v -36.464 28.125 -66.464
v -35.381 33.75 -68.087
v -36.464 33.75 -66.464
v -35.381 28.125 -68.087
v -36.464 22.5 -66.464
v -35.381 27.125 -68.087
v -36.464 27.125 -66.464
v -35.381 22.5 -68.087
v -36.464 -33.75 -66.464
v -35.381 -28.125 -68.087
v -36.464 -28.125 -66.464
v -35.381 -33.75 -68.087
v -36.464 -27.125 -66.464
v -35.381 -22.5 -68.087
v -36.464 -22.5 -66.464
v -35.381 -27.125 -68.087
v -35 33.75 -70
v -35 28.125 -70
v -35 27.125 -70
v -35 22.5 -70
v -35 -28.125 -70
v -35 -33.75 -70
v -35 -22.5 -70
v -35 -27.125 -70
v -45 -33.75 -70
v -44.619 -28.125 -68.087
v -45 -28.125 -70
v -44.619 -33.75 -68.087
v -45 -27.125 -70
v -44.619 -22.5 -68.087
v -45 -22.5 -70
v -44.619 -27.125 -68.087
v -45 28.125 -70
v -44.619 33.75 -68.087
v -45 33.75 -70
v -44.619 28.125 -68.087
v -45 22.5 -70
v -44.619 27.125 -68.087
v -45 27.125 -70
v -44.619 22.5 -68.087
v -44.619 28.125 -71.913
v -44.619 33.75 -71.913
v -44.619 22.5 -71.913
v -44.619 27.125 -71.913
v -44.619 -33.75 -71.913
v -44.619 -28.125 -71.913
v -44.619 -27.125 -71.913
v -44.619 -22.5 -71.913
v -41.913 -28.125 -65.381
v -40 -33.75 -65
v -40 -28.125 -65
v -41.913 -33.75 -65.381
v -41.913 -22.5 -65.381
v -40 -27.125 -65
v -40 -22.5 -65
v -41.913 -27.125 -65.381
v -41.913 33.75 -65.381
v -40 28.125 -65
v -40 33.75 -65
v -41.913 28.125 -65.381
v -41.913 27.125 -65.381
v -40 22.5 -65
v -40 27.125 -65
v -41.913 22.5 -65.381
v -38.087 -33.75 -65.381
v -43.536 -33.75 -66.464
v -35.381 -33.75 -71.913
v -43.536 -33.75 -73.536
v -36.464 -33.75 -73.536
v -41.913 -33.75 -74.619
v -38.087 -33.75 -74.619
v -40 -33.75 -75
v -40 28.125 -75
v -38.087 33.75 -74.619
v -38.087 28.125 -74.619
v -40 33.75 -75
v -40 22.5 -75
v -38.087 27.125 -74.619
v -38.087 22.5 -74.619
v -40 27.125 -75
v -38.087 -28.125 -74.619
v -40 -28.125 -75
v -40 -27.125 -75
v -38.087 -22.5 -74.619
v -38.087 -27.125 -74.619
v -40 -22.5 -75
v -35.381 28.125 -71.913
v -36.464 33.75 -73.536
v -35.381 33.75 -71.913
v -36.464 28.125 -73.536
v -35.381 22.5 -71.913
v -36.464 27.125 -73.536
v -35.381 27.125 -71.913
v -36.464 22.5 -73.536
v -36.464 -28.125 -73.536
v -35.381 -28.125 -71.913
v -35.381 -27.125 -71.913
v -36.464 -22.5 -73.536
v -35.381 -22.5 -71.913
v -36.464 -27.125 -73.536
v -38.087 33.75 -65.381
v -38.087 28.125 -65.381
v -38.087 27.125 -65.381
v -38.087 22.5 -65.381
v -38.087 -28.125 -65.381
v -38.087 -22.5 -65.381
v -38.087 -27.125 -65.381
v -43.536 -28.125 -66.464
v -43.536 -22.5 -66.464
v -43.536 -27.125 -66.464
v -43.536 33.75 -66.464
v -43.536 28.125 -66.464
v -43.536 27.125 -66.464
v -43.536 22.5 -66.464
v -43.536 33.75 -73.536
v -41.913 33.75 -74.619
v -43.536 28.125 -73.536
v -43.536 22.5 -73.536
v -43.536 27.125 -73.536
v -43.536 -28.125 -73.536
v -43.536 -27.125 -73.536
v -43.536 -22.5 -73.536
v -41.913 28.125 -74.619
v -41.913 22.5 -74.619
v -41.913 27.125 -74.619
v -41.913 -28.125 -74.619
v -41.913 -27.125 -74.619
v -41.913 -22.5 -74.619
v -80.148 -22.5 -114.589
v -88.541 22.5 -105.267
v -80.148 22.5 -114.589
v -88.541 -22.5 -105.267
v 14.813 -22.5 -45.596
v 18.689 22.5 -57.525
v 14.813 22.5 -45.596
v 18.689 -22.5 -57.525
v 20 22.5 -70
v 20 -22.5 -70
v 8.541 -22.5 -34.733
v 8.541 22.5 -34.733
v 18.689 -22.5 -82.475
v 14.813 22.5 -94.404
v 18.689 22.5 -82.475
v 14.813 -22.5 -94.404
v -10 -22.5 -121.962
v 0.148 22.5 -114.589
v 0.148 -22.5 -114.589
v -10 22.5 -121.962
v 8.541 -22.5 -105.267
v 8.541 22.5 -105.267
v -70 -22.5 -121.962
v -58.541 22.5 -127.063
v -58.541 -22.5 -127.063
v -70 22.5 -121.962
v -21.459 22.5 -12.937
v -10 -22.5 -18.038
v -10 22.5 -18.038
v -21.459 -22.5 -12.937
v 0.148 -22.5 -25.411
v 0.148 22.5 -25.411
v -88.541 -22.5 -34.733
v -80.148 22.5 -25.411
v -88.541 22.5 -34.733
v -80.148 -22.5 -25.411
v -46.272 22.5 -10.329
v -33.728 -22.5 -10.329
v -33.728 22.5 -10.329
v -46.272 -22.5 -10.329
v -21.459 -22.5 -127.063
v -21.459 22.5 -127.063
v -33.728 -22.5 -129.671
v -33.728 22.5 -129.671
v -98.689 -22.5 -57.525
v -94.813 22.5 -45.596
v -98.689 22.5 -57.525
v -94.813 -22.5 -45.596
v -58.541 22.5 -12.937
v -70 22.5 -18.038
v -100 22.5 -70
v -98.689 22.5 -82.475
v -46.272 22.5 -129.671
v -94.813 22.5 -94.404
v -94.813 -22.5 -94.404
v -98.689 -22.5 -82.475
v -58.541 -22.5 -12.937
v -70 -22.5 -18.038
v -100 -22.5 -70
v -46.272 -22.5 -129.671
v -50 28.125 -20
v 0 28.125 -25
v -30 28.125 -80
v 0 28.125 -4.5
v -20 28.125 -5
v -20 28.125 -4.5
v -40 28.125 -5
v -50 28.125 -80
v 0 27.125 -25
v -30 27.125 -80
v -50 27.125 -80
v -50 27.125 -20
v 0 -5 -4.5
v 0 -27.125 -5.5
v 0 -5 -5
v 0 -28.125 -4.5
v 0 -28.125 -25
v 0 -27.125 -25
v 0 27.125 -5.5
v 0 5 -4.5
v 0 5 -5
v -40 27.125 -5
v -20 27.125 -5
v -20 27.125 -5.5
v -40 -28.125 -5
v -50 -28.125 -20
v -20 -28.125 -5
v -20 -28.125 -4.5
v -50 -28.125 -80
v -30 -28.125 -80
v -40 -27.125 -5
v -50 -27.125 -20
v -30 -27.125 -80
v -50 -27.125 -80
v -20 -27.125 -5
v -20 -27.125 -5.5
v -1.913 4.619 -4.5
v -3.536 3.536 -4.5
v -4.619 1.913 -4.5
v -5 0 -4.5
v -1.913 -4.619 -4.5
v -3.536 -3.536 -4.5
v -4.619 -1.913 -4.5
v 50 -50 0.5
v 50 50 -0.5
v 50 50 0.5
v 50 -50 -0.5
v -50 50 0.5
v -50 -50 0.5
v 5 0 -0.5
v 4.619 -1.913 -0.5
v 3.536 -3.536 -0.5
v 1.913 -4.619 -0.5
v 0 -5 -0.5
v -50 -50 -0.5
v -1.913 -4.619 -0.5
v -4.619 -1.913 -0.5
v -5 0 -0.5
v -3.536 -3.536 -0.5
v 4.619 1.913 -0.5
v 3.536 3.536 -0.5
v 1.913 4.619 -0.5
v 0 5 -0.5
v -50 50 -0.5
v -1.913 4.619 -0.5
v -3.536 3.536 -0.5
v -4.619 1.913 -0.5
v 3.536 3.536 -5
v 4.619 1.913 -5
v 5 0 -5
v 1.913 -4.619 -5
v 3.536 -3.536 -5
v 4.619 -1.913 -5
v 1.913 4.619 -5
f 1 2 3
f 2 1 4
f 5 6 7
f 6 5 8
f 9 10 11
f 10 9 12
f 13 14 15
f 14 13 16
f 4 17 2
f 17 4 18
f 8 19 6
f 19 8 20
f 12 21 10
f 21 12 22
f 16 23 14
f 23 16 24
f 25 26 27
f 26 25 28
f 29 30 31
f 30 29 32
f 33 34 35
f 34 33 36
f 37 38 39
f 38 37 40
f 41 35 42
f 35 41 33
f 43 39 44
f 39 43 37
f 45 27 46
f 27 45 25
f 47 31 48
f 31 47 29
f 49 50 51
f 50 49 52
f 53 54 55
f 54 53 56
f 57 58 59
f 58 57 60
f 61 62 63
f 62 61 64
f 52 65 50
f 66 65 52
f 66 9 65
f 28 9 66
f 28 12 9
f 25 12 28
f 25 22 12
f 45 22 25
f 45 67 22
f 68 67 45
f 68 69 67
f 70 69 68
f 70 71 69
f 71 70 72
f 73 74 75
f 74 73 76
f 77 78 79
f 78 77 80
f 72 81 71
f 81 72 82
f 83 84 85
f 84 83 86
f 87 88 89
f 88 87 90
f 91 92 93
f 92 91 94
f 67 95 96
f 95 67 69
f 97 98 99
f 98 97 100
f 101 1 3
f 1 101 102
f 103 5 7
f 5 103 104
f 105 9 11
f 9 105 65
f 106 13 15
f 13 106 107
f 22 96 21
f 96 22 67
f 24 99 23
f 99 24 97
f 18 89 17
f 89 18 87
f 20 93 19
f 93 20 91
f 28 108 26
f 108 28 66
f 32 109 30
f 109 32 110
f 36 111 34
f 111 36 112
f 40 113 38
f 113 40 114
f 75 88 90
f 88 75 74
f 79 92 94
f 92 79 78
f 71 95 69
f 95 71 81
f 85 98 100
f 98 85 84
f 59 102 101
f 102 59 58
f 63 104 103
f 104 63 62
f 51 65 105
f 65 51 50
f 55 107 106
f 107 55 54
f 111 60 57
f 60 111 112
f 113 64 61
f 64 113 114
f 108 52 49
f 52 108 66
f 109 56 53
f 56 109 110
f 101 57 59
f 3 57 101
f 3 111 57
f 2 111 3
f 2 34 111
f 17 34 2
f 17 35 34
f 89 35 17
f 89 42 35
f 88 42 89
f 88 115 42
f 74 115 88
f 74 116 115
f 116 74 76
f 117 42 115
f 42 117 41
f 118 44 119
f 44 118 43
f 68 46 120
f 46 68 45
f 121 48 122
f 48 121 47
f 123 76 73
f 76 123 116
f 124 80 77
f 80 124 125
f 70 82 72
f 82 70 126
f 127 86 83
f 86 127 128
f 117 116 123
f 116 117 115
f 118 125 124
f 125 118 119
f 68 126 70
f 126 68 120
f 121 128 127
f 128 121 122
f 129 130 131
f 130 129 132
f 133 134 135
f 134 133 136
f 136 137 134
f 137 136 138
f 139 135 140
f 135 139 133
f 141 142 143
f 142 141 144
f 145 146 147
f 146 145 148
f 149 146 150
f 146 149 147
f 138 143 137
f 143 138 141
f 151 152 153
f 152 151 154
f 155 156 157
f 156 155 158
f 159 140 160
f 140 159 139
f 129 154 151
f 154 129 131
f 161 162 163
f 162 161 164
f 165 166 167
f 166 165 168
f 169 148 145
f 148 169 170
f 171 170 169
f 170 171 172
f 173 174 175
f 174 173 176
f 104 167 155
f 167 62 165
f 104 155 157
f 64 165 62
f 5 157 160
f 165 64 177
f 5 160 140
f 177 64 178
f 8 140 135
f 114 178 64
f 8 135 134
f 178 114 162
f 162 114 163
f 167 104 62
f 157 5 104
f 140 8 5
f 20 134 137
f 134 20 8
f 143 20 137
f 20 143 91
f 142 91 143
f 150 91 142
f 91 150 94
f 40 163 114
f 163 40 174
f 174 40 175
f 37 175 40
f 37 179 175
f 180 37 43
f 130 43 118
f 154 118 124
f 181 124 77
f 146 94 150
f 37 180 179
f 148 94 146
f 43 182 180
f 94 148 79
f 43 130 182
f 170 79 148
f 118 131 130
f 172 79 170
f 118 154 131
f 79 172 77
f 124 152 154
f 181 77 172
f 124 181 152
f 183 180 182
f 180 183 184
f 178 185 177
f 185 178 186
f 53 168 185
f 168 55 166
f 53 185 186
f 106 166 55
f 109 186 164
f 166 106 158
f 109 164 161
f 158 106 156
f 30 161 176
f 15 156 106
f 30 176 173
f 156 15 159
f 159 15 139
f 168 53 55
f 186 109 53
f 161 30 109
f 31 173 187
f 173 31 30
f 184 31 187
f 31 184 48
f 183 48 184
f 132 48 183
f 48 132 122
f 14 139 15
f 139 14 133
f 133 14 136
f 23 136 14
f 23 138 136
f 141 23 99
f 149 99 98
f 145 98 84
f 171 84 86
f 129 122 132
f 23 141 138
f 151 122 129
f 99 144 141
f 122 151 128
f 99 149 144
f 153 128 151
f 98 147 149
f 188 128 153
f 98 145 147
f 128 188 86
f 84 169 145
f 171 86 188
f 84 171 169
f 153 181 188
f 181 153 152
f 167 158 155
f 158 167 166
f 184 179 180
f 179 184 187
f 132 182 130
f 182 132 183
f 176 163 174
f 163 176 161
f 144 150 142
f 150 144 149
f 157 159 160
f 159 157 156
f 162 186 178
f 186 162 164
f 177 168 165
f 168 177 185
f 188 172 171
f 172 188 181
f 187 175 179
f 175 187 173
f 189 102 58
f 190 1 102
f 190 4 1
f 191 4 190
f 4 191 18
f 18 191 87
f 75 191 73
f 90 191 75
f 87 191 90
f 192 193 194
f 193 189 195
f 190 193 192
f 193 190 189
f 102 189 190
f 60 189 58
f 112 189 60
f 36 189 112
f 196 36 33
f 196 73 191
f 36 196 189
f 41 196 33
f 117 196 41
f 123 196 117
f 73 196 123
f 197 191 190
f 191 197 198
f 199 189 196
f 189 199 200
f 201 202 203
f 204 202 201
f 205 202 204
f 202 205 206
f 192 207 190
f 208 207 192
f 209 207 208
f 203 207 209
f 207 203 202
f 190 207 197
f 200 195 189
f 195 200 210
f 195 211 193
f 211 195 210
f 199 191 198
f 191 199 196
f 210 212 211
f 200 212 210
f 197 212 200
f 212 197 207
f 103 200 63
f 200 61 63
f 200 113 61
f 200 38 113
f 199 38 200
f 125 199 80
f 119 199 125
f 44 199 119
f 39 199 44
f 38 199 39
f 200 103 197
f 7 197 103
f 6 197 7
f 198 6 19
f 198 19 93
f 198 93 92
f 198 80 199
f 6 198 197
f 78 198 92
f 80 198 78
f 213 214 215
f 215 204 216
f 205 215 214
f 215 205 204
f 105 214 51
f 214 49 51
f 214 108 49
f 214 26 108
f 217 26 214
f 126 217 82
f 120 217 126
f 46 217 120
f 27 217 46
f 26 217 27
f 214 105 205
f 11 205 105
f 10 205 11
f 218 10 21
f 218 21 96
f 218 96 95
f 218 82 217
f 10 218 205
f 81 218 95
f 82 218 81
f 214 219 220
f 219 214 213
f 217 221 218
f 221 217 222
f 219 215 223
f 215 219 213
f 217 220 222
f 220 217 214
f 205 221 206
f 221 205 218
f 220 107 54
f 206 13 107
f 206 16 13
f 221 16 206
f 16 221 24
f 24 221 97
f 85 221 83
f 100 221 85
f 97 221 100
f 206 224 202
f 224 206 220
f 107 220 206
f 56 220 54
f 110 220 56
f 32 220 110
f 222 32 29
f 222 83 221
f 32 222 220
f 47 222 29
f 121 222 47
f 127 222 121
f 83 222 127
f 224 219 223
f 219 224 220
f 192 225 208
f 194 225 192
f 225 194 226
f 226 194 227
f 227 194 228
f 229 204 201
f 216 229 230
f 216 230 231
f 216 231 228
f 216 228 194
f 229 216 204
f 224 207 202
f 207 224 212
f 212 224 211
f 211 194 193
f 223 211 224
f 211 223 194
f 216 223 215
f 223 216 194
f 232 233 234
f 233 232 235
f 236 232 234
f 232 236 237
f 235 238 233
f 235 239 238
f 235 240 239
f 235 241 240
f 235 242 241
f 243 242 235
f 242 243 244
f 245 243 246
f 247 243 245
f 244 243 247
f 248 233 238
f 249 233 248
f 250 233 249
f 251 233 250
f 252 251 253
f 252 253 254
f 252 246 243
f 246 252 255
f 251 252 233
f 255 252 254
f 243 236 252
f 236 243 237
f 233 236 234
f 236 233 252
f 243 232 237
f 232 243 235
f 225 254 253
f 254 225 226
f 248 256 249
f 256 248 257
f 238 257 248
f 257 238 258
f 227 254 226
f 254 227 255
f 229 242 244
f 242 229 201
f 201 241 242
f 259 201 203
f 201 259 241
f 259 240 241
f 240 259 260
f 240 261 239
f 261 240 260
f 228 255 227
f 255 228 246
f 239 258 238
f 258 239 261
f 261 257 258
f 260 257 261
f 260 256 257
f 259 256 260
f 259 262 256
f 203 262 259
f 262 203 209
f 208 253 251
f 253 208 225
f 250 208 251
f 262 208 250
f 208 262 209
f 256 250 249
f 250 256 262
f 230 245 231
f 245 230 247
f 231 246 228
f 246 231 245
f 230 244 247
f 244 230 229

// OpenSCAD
module CastorWheel(lod=0, wheeldiam=120, wheelwidth=45, castordistance=40, platesize=100, totalheight=130, wheeltheta=00, castortheta=0){
    
    module CastorHalfArm(){
        hull(){
            translate([0, wheelwidth/2*1.25, wheeldiam/2-5])
            rotate([90, 0, 0])
            translate([0, -10, 0])
            cube([castordistance, 20, 1], center=false);
            
            translate([0, wheelwidth/2*1.25, -10])
            rotate([90, -90, 0])
            translate([0, -10, 0])
            cube([wheeldiam/2, 20, 1], center=false);
        }
    }
    
    module CastorArm(){
        CastorHalfArm();
        mirror([0, 1, 0]){
            CastorHalfArm();
        }
        translate([castordistance-10, 0, wheeldiam/2+5])
        {
            cube([20, wheelwidth*1.25, 1], center=true);
        }
    }
    //CastorArm();
    
    if (lod==0){
        cube([platesize, platesize, 1], center=true);
        translate([0,0,-5])
        color([1,0,0])
        cylinder(5, d=10);
        rotate([0, 0, castortheta]) {

            
            translate([-castordistance, 0, -totalheight+wheeldiam/2]){
                rotate([90, 0, 0]) {
                    color([1,0,0])
                    cylinder(h=wheelwidth*1.5, d=10, center=true);    
                    
                    rotate([0, 0, wheeltheta])
                    color([.3,.3,.3])
                    cylinder(h=wheelwidth, d=wheeldiam, center=true);
                };
                CastorArm();
            }
        }
    }
}

CastorWheel();
